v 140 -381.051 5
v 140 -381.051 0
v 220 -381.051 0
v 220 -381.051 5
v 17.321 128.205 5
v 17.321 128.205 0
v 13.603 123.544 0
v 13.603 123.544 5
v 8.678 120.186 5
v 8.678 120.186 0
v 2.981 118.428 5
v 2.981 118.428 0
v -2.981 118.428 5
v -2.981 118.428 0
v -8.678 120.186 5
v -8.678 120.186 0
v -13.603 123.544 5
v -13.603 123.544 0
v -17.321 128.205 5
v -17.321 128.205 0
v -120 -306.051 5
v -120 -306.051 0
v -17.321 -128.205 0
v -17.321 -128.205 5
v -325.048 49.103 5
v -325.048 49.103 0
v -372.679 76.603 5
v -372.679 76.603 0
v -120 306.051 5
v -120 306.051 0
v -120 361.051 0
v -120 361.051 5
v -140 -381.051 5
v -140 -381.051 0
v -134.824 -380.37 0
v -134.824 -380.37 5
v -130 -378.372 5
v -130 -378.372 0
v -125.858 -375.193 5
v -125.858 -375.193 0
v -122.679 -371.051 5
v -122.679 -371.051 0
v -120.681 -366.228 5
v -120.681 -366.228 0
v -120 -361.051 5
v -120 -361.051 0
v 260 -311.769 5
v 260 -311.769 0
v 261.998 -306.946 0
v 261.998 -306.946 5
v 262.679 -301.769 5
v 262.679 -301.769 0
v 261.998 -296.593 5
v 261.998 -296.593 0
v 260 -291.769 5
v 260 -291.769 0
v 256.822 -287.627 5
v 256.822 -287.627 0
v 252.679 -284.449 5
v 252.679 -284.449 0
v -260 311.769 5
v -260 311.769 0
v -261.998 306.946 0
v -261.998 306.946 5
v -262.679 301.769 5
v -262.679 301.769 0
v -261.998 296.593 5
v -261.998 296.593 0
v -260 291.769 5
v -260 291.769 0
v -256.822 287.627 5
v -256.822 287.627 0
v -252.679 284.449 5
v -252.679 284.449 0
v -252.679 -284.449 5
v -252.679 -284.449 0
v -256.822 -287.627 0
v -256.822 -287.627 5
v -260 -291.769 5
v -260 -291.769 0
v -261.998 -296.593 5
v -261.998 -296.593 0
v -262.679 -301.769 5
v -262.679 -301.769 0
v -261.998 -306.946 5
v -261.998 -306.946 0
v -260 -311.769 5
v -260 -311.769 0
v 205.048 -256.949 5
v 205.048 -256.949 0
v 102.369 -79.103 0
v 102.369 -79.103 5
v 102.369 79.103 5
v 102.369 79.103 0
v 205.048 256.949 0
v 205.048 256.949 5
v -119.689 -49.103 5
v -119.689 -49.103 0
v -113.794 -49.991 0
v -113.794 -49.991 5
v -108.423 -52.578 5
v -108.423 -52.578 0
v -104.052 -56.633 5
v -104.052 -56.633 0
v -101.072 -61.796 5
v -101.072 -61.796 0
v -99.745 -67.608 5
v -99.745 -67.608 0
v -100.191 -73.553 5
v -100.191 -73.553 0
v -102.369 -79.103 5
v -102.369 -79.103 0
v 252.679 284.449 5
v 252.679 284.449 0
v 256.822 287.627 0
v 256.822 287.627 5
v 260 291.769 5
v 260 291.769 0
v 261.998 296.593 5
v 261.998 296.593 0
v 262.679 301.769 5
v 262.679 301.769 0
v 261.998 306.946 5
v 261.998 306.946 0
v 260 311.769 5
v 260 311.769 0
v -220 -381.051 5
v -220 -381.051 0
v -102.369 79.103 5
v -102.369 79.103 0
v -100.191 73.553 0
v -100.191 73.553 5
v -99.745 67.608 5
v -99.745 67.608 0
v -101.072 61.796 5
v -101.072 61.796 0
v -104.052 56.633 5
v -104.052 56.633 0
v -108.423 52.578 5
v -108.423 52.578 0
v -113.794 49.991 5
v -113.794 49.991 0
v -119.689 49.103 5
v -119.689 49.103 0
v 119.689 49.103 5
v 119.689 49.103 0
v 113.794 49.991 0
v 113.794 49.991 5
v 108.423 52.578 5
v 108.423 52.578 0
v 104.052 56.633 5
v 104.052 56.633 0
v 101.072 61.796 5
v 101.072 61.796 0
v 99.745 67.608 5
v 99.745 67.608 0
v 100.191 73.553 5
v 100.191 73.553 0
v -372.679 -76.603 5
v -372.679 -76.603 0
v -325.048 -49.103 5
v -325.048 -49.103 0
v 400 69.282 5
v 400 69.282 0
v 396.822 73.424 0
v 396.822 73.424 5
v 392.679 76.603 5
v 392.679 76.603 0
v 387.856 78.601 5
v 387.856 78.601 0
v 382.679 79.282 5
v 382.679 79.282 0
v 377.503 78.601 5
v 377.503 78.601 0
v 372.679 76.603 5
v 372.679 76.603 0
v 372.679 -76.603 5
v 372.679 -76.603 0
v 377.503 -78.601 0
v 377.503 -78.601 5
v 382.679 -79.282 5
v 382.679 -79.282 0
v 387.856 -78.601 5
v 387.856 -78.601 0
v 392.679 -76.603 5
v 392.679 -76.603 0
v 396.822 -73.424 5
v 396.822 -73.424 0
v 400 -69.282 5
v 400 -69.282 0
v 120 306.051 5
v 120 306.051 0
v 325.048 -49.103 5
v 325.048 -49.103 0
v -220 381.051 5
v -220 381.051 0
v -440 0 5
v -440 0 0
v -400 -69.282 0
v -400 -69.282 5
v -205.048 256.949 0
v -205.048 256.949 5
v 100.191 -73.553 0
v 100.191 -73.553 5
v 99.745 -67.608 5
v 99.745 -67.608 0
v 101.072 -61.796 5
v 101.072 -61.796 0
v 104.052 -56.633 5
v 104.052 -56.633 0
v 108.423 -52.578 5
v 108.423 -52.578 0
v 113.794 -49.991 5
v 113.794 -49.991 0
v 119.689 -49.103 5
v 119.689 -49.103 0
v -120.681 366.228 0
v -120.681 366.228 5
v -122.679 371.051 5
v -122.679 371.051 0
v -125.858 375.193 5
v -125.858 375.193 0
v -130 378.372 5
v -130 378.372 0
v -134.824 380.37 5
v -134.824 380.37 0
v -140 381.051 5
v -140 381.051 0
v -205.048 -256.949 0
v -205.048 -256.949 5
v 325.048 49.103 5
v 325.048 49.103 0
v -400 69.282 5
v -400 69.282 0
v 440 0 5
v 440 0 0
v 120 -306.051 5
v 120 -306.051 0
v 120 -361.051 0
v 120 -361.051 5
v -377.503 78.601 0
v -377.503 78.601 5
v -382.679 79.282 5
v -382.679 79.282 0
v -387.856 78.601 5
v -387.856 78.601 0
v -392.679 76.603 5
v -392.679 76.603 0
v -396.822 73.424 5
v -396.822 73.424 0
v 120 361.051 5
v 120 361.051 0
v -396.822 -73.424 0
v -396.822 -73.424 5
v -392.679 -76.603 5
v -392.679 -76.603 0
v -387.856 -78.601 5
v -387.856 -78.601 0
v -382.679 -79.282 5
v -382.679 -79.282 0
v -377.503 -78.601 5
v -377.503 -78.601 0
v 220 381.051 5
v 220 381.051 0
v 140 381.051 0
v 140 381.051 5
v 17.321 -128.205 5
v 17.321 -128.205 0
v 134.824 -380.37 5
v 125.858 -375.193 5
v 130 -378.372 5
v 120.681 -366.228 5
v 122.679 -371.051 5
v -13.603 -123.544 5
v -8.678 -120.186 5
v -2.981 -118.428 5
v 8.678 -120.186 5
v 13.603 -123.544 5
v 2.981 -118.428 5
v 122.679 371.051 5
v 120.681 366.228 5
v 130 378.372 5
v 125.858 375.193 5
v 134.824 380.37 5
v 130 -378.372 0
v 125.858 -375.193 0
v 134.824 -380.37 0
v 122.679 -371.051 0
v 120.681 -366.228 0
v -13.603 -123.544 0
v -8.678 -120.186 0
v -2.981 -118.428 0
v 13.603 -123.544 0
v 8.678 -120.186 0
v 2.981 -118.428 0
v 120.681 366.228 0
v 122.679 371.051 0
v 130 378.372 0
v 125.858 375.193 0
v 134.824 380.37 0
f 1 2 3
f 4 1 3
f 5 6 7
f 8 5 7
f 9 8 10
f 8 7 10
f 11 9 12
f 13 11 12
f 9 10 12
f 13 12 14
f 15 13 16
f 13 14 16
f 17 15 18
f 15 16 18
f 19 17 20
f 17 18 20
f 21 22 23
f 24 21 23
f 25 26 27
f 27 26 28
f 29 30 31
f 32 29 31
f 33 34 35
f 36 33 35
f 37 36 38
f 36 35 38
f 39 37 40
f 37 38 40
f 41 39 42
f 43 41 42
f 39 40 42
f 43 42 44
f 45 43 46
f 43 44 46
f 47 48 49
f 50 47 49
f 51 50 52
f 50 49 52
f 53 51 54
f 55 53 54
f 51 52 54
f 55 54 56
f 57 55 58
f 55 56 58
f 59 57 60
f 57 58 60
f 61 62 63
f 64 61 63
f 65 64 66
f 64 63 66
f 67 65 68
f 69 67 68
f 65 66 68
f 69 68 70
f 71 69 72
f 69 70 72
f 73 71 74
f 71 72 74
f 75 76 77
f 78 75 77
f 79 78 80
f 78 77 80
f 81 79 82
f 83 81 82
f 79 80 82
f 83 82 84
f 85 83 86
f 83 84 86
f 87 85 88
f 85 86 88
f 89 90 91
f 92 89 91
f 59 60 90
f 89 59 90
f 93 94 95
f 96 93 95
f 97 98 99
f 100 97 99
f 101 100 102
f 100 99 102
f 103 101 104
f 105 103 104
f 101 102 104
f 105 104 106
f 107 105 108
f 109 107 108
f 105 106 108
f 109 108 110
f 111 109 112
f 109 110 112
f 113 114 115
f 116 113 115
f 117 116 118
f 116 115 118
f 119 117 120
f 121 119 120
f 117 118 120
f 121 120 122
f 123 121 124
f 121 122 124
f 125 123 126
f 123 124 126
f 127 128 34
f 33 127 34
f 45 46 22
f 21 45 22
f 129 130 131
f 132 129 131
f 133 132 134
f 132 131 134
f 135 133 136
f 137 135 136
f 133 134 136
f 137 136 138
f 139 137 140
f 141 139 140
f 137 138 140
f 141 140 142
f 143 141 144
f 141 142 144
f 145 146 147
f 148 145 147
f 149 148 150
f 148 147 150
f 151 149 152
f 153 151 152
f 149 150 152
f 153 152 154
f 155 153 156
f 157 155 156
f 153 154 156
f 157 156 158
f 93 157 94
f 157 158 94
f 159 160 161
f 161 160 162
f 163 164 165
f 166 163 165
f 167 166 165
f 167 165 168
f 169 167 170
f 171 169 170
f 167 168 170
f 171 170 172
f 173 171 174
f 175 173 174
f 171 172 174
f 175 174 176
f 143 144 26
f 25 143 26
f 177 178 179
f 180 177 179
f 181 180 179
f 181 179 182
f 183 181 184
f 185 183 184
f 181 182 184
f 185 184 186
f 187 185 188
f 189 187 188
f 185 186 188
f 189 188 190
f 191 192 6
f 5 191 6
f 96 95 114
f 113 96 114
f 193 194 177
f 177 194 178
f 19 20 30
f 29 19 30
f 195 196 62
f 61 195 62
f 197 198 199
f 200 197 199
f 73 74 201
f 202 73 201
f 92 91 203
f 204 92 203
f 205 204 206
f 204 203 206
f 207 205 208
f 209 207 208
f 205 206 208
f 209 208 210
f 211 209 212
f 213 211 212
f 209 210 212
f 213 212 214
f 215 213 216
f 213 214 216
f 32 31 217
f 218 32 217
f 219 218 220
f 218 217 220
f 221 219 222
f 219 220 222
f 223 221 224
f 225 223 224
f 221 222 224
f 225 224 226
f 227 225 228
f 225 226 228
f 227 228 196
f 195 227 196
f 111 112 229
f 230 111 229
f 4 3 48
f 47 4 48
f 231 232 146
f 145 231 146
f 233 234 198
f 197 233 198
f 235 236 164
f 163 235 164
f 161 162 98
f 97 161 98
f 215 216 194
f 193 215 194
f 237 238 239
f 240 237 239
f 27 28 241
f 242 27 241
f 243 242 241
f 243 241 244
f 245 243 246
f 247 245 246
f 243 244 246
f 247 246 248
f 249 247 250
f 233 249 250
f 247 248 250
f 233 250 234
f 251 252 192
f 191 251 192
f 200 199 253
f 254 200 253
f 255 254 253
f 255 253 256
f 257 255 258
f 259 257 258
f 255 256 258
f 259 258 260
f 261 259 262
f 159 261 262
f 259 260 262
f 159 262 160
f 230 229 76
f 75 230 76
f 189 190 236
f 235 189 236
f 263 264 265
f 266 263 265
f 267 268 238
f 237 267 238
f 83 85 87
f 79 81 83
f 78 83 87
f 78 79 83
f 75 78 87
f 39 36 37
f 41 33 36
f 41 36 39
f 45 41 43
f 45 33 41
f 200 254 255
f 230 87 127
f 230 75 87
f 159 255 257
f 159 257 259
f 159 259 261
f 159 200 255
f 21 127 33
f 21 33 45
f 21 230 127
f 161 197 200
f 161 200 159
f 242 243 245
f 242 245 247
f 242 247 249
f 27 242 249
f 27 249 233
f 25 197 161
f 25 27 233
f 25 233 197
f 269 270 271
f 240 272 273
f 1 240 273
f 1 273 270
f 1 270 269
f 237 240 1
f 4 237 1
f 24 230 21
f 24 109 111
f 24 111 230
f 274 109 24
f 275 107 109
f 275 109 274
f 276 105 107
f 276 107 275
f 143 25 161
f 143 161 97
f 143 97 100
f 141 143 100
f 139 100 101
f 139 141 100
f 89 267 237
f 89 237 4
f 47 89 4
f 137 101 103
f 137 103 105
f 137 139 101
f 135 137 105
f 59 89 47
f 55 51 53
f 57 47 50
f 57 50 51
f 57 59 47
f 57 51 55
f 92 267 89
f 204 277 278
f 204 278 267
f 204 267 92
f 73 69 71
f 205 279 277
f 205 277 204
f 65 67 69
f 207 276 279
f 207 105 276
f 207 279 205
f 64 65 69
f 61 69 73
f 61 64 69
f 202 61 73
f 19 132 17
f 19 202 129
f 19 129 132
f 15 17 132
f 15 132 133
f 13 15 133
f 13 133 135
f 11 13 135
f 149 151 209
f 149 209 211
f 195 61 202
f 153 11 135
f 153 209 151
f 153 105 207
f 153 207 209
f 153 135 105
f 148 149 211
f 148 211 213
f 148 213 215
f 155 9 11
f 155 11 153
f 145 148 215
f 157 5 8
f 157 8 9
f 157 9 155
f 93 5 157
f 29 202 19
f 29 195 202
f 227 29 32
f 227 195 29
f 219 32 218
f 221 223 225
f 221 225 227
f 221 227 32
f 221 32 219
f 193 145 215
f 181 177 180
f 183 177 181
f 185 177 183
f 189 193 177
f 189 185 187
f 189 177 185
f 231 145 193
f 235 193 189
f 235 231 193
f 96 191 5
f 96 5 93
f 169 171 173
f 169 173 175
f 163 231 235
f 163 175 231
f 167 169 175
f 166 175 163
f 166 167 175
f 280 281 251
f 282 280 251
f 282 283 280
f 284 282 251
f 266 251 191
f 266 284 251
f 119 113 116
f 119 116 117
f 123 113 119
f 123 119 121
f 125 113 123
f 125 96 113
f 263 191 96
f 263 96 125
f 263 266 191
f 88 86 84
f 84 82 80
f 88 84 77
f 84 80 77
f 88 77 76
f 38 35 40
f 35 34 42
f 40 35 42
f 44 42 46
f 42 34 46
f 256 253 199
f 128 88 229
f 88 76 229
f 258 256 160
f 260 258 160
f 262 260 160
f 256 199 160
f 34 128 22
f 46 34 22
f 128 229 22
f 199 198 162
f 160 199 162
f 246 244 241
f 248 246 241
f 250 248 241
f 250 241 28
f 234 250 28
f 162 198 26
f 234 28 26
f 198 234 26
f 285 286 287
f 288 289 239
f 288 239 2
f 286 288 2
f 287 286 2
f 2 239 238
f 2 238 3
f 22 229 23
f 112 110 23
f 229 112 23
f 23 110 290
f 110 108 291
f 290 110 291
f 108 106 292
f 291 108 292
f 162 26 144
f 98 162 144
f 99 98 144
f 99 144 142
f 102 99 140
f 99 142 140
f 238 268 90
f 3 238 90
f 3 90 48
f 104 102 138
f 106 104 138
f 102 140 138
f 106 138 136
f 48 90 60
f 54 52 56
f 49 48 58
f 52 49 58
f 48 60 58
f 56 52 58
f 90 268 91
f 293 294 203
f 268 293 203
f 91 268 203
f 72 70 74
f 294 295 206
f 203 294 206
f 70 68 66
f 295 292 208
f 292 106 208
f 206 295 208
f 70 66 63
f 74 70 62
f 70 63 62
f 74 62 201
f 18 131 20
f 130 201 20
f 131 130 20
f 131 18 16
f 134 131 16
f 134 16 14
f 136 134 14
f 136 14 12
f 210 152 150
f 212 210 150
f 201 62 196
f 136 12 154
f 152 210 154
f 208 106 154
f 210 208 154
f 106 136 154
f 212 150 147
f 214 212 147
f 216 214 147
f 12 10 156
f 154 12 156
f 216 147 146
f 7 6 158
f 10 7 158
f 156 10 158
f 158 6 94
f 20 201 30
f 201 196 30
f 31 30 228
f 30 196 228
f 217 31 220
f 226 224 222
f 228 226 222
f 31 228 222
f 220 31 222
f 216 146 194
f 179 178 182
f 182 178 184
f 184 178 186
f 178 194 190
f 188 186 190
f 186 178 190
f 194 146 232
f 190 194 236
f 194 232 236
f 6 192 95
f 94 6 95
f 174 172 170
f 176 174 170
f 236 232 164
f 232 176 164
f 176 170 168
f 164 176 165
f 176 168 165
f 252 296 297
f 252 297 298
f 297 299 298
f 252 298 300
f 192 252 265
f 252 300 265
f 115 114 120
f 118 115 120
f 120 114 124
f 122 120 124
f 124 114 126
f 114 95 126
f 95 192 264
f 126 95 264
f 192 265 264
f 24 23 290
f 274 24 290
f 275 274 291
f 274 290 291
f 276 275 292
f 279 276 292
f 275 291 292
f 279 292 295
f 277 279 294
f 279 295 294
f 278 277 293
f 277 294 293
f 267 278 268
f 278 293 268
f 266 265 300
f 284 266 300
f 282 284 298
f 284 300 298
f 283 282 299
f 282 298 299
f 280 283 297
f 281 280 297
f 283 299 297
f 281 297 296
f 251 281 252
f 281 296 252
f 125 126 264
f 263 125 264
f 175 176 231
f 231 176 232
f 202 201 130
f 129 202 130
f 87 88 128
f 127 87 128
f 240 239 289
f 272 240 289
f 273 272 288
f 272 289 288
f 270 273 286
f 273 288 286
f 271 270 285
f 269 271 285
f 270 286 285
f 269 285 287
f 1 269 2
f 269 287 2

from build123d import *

# Parameters (mm, degrees)
BOSS_EXTRU_2_DEPTH = 5


with BuildPart() as part:
    # Esquisse2 → Boss.-Extru.2 (new body)
    with BuildSketch(Plane.XY):
        with BuildLine():
            Line((-440, 0), (-400, -69.282032303))
            ThreePointArc((-400, -69.282032303), (-387.855872826, -78.600548829), (-372.679491924, -76.602540378))
            Line((-372.679491924, -76.602540378), (-325.048094716, -49.102540378))
            Line((-325.048094716, -49.102540378), (-119.689110868, -49.102540378))
            ThreePointArc((-119.689110868, -49.102540378), (-102.368602792, -59.102540378), (-102.368602792, -79.102540378))
            Line((-102.368602792, -79.102540378), (-205.048094716, -256.948637287))
            Line((-205.048094716, -256.948637287), (-252.679491924, -284.448637287))
            ThreePointArc((-252.679491924, -284.448637287), (-261.99800845, -296.59276446), (-260, -311.769145362))
            Line((-260, -311.769145362), (-220, -381.051177665))
            Line((-220, -381.051177665), (-140, -381.051177665))
            ThreePointArc((-140, -381.051177665), (-125.857864376, -375.193313289), (-120, -361.051177665))
            Line((-120, -361.051177665), (-120, -306.051177665))
            Line((-120, -306.051177665), (-17.320508076, -128.205080757))
            ThreePointArc((-17.320508076, -128.205080757), (0, -118.205080757), (17.320508076, -128.205080757))
            Line((17.320508076, -128.205080757), (120, -306.051177665))
            Line((120, -306.051177665), (120, -361.051177665))
            ThreePointArc((120, -361.051177665), (125.857864376, -375.193313289), (140, -381.051177665))
            Line((140, -381.051177665), (220, -381.051177665))
            Line((220, -381.051177665), (260, -311.769145362))
            ThreePointArc((260, -311.769145362), (261.99800845, -296.59276446), (252.679491924, -284.448637287))
            Line((252.679491924, -284.448637287), (205.048094716, -256.948637287))
            Line((205.048094716, -256.948637287), (102.368602792, -79.102540378))
            ThreePointArc((102.368602792, -79.102540378), (102.368602792, -59.102540378), (119.689110868, -49.102540378))
            Line((119.689110868, -49.102540378), (325.048094716, -49.102540378))
            Line((325.048094716, -49.102540378), (372.679491924, -76.602540378))
            ThreePointArc((372.679491924, -76.602540378), (387.855872826, -78.600548829), (400, -69.282032303))
            Line((400, -69.282032303), (440, 0))
            Line((440, 0), (400, 69.282032303))
            ThreePointArc((400, 69.282032303), (387.855872826, 78.600548829), (372.679491924, 76.602540378))
            Line((372.679491924, 76.602540378), (325.048094716, 49.102540378))
            Line((325.048094716, 49.102540378), (119.689110868, 49.102540378))
            ThreePointArc((119.689110868, 49.102540378), (102.368602792, 59.102540378), (102.368602792, 79.102540378))
            Line((102.368602792, 79.102540378), (205.048094716, 256.948637287))
            Line((205.048094716, 256.948637287), (252.679491924, 284.448637287))
            ThreePointArc((252.679491924, 284.448637287), (261.99800845, 296.59276446), (260, 311.769145362))
            Line((260, 311.769145362), (220, 381.051177665))
            Line((220, 381.051177665), (140, 381.051177665))
            ThreePointArc((140, 381.051177665), (125.857864376, 375.193313289), (120, 361.051177665))
            Line((120, 361.051177665), (120, 306.051177665))
            Line((120, 306.051177665), (17.320508076, 128.205080757))
            ThreePointArc((17.320508076, 128.205080757), (0, 118.205080757), (-17.320508076, 128.205080757))
            Line((-17.320508076, 128.205080757), (-120, 306.051177665))
            Line((-120, 306.051177665), (-120, 361.051177665))
            ThreePointArc((-120, 361.051177665), (-125.857864376, 375.193313289), (-140, 381.051177665))
            Line((-140, 381.051177665), (-220, 381.051177665))
            Line((-220, 381.051177665), (-260, 311.769145362))
            ThreePointArc((-260, 311.769145362), (-261.99800845, 296.59276446), (-252.679491924, 284.448637287))
            Line((-252.679491924, 284.448637287), (-205.048094716, 256.948637287))
            Line((-205.048094716, 256.948637287), (-102.368602792, 79.102540378))
            ThreePointArc((-102.368602792, 79.102540378), (-102.368602792, 59.102540378), (-119.689110868, 49.102540378))
            Line((-119.689110868, 49.102540378), (-325.048094716, 49.102540378))
            Line((-325.048094716, 49.102540378), (-372.679491924, 76.602540378))
            ThreePointArc((-372.679491924, 76.602540378), (-387.855872826, 78.600548829), (-400, 69.282032303))
            Line((-400, 69.282032303), (-440, 0))
        make_face()
    extrude(amount=BOSS_EXTRU_2_DEPTH)


solid = part.part
